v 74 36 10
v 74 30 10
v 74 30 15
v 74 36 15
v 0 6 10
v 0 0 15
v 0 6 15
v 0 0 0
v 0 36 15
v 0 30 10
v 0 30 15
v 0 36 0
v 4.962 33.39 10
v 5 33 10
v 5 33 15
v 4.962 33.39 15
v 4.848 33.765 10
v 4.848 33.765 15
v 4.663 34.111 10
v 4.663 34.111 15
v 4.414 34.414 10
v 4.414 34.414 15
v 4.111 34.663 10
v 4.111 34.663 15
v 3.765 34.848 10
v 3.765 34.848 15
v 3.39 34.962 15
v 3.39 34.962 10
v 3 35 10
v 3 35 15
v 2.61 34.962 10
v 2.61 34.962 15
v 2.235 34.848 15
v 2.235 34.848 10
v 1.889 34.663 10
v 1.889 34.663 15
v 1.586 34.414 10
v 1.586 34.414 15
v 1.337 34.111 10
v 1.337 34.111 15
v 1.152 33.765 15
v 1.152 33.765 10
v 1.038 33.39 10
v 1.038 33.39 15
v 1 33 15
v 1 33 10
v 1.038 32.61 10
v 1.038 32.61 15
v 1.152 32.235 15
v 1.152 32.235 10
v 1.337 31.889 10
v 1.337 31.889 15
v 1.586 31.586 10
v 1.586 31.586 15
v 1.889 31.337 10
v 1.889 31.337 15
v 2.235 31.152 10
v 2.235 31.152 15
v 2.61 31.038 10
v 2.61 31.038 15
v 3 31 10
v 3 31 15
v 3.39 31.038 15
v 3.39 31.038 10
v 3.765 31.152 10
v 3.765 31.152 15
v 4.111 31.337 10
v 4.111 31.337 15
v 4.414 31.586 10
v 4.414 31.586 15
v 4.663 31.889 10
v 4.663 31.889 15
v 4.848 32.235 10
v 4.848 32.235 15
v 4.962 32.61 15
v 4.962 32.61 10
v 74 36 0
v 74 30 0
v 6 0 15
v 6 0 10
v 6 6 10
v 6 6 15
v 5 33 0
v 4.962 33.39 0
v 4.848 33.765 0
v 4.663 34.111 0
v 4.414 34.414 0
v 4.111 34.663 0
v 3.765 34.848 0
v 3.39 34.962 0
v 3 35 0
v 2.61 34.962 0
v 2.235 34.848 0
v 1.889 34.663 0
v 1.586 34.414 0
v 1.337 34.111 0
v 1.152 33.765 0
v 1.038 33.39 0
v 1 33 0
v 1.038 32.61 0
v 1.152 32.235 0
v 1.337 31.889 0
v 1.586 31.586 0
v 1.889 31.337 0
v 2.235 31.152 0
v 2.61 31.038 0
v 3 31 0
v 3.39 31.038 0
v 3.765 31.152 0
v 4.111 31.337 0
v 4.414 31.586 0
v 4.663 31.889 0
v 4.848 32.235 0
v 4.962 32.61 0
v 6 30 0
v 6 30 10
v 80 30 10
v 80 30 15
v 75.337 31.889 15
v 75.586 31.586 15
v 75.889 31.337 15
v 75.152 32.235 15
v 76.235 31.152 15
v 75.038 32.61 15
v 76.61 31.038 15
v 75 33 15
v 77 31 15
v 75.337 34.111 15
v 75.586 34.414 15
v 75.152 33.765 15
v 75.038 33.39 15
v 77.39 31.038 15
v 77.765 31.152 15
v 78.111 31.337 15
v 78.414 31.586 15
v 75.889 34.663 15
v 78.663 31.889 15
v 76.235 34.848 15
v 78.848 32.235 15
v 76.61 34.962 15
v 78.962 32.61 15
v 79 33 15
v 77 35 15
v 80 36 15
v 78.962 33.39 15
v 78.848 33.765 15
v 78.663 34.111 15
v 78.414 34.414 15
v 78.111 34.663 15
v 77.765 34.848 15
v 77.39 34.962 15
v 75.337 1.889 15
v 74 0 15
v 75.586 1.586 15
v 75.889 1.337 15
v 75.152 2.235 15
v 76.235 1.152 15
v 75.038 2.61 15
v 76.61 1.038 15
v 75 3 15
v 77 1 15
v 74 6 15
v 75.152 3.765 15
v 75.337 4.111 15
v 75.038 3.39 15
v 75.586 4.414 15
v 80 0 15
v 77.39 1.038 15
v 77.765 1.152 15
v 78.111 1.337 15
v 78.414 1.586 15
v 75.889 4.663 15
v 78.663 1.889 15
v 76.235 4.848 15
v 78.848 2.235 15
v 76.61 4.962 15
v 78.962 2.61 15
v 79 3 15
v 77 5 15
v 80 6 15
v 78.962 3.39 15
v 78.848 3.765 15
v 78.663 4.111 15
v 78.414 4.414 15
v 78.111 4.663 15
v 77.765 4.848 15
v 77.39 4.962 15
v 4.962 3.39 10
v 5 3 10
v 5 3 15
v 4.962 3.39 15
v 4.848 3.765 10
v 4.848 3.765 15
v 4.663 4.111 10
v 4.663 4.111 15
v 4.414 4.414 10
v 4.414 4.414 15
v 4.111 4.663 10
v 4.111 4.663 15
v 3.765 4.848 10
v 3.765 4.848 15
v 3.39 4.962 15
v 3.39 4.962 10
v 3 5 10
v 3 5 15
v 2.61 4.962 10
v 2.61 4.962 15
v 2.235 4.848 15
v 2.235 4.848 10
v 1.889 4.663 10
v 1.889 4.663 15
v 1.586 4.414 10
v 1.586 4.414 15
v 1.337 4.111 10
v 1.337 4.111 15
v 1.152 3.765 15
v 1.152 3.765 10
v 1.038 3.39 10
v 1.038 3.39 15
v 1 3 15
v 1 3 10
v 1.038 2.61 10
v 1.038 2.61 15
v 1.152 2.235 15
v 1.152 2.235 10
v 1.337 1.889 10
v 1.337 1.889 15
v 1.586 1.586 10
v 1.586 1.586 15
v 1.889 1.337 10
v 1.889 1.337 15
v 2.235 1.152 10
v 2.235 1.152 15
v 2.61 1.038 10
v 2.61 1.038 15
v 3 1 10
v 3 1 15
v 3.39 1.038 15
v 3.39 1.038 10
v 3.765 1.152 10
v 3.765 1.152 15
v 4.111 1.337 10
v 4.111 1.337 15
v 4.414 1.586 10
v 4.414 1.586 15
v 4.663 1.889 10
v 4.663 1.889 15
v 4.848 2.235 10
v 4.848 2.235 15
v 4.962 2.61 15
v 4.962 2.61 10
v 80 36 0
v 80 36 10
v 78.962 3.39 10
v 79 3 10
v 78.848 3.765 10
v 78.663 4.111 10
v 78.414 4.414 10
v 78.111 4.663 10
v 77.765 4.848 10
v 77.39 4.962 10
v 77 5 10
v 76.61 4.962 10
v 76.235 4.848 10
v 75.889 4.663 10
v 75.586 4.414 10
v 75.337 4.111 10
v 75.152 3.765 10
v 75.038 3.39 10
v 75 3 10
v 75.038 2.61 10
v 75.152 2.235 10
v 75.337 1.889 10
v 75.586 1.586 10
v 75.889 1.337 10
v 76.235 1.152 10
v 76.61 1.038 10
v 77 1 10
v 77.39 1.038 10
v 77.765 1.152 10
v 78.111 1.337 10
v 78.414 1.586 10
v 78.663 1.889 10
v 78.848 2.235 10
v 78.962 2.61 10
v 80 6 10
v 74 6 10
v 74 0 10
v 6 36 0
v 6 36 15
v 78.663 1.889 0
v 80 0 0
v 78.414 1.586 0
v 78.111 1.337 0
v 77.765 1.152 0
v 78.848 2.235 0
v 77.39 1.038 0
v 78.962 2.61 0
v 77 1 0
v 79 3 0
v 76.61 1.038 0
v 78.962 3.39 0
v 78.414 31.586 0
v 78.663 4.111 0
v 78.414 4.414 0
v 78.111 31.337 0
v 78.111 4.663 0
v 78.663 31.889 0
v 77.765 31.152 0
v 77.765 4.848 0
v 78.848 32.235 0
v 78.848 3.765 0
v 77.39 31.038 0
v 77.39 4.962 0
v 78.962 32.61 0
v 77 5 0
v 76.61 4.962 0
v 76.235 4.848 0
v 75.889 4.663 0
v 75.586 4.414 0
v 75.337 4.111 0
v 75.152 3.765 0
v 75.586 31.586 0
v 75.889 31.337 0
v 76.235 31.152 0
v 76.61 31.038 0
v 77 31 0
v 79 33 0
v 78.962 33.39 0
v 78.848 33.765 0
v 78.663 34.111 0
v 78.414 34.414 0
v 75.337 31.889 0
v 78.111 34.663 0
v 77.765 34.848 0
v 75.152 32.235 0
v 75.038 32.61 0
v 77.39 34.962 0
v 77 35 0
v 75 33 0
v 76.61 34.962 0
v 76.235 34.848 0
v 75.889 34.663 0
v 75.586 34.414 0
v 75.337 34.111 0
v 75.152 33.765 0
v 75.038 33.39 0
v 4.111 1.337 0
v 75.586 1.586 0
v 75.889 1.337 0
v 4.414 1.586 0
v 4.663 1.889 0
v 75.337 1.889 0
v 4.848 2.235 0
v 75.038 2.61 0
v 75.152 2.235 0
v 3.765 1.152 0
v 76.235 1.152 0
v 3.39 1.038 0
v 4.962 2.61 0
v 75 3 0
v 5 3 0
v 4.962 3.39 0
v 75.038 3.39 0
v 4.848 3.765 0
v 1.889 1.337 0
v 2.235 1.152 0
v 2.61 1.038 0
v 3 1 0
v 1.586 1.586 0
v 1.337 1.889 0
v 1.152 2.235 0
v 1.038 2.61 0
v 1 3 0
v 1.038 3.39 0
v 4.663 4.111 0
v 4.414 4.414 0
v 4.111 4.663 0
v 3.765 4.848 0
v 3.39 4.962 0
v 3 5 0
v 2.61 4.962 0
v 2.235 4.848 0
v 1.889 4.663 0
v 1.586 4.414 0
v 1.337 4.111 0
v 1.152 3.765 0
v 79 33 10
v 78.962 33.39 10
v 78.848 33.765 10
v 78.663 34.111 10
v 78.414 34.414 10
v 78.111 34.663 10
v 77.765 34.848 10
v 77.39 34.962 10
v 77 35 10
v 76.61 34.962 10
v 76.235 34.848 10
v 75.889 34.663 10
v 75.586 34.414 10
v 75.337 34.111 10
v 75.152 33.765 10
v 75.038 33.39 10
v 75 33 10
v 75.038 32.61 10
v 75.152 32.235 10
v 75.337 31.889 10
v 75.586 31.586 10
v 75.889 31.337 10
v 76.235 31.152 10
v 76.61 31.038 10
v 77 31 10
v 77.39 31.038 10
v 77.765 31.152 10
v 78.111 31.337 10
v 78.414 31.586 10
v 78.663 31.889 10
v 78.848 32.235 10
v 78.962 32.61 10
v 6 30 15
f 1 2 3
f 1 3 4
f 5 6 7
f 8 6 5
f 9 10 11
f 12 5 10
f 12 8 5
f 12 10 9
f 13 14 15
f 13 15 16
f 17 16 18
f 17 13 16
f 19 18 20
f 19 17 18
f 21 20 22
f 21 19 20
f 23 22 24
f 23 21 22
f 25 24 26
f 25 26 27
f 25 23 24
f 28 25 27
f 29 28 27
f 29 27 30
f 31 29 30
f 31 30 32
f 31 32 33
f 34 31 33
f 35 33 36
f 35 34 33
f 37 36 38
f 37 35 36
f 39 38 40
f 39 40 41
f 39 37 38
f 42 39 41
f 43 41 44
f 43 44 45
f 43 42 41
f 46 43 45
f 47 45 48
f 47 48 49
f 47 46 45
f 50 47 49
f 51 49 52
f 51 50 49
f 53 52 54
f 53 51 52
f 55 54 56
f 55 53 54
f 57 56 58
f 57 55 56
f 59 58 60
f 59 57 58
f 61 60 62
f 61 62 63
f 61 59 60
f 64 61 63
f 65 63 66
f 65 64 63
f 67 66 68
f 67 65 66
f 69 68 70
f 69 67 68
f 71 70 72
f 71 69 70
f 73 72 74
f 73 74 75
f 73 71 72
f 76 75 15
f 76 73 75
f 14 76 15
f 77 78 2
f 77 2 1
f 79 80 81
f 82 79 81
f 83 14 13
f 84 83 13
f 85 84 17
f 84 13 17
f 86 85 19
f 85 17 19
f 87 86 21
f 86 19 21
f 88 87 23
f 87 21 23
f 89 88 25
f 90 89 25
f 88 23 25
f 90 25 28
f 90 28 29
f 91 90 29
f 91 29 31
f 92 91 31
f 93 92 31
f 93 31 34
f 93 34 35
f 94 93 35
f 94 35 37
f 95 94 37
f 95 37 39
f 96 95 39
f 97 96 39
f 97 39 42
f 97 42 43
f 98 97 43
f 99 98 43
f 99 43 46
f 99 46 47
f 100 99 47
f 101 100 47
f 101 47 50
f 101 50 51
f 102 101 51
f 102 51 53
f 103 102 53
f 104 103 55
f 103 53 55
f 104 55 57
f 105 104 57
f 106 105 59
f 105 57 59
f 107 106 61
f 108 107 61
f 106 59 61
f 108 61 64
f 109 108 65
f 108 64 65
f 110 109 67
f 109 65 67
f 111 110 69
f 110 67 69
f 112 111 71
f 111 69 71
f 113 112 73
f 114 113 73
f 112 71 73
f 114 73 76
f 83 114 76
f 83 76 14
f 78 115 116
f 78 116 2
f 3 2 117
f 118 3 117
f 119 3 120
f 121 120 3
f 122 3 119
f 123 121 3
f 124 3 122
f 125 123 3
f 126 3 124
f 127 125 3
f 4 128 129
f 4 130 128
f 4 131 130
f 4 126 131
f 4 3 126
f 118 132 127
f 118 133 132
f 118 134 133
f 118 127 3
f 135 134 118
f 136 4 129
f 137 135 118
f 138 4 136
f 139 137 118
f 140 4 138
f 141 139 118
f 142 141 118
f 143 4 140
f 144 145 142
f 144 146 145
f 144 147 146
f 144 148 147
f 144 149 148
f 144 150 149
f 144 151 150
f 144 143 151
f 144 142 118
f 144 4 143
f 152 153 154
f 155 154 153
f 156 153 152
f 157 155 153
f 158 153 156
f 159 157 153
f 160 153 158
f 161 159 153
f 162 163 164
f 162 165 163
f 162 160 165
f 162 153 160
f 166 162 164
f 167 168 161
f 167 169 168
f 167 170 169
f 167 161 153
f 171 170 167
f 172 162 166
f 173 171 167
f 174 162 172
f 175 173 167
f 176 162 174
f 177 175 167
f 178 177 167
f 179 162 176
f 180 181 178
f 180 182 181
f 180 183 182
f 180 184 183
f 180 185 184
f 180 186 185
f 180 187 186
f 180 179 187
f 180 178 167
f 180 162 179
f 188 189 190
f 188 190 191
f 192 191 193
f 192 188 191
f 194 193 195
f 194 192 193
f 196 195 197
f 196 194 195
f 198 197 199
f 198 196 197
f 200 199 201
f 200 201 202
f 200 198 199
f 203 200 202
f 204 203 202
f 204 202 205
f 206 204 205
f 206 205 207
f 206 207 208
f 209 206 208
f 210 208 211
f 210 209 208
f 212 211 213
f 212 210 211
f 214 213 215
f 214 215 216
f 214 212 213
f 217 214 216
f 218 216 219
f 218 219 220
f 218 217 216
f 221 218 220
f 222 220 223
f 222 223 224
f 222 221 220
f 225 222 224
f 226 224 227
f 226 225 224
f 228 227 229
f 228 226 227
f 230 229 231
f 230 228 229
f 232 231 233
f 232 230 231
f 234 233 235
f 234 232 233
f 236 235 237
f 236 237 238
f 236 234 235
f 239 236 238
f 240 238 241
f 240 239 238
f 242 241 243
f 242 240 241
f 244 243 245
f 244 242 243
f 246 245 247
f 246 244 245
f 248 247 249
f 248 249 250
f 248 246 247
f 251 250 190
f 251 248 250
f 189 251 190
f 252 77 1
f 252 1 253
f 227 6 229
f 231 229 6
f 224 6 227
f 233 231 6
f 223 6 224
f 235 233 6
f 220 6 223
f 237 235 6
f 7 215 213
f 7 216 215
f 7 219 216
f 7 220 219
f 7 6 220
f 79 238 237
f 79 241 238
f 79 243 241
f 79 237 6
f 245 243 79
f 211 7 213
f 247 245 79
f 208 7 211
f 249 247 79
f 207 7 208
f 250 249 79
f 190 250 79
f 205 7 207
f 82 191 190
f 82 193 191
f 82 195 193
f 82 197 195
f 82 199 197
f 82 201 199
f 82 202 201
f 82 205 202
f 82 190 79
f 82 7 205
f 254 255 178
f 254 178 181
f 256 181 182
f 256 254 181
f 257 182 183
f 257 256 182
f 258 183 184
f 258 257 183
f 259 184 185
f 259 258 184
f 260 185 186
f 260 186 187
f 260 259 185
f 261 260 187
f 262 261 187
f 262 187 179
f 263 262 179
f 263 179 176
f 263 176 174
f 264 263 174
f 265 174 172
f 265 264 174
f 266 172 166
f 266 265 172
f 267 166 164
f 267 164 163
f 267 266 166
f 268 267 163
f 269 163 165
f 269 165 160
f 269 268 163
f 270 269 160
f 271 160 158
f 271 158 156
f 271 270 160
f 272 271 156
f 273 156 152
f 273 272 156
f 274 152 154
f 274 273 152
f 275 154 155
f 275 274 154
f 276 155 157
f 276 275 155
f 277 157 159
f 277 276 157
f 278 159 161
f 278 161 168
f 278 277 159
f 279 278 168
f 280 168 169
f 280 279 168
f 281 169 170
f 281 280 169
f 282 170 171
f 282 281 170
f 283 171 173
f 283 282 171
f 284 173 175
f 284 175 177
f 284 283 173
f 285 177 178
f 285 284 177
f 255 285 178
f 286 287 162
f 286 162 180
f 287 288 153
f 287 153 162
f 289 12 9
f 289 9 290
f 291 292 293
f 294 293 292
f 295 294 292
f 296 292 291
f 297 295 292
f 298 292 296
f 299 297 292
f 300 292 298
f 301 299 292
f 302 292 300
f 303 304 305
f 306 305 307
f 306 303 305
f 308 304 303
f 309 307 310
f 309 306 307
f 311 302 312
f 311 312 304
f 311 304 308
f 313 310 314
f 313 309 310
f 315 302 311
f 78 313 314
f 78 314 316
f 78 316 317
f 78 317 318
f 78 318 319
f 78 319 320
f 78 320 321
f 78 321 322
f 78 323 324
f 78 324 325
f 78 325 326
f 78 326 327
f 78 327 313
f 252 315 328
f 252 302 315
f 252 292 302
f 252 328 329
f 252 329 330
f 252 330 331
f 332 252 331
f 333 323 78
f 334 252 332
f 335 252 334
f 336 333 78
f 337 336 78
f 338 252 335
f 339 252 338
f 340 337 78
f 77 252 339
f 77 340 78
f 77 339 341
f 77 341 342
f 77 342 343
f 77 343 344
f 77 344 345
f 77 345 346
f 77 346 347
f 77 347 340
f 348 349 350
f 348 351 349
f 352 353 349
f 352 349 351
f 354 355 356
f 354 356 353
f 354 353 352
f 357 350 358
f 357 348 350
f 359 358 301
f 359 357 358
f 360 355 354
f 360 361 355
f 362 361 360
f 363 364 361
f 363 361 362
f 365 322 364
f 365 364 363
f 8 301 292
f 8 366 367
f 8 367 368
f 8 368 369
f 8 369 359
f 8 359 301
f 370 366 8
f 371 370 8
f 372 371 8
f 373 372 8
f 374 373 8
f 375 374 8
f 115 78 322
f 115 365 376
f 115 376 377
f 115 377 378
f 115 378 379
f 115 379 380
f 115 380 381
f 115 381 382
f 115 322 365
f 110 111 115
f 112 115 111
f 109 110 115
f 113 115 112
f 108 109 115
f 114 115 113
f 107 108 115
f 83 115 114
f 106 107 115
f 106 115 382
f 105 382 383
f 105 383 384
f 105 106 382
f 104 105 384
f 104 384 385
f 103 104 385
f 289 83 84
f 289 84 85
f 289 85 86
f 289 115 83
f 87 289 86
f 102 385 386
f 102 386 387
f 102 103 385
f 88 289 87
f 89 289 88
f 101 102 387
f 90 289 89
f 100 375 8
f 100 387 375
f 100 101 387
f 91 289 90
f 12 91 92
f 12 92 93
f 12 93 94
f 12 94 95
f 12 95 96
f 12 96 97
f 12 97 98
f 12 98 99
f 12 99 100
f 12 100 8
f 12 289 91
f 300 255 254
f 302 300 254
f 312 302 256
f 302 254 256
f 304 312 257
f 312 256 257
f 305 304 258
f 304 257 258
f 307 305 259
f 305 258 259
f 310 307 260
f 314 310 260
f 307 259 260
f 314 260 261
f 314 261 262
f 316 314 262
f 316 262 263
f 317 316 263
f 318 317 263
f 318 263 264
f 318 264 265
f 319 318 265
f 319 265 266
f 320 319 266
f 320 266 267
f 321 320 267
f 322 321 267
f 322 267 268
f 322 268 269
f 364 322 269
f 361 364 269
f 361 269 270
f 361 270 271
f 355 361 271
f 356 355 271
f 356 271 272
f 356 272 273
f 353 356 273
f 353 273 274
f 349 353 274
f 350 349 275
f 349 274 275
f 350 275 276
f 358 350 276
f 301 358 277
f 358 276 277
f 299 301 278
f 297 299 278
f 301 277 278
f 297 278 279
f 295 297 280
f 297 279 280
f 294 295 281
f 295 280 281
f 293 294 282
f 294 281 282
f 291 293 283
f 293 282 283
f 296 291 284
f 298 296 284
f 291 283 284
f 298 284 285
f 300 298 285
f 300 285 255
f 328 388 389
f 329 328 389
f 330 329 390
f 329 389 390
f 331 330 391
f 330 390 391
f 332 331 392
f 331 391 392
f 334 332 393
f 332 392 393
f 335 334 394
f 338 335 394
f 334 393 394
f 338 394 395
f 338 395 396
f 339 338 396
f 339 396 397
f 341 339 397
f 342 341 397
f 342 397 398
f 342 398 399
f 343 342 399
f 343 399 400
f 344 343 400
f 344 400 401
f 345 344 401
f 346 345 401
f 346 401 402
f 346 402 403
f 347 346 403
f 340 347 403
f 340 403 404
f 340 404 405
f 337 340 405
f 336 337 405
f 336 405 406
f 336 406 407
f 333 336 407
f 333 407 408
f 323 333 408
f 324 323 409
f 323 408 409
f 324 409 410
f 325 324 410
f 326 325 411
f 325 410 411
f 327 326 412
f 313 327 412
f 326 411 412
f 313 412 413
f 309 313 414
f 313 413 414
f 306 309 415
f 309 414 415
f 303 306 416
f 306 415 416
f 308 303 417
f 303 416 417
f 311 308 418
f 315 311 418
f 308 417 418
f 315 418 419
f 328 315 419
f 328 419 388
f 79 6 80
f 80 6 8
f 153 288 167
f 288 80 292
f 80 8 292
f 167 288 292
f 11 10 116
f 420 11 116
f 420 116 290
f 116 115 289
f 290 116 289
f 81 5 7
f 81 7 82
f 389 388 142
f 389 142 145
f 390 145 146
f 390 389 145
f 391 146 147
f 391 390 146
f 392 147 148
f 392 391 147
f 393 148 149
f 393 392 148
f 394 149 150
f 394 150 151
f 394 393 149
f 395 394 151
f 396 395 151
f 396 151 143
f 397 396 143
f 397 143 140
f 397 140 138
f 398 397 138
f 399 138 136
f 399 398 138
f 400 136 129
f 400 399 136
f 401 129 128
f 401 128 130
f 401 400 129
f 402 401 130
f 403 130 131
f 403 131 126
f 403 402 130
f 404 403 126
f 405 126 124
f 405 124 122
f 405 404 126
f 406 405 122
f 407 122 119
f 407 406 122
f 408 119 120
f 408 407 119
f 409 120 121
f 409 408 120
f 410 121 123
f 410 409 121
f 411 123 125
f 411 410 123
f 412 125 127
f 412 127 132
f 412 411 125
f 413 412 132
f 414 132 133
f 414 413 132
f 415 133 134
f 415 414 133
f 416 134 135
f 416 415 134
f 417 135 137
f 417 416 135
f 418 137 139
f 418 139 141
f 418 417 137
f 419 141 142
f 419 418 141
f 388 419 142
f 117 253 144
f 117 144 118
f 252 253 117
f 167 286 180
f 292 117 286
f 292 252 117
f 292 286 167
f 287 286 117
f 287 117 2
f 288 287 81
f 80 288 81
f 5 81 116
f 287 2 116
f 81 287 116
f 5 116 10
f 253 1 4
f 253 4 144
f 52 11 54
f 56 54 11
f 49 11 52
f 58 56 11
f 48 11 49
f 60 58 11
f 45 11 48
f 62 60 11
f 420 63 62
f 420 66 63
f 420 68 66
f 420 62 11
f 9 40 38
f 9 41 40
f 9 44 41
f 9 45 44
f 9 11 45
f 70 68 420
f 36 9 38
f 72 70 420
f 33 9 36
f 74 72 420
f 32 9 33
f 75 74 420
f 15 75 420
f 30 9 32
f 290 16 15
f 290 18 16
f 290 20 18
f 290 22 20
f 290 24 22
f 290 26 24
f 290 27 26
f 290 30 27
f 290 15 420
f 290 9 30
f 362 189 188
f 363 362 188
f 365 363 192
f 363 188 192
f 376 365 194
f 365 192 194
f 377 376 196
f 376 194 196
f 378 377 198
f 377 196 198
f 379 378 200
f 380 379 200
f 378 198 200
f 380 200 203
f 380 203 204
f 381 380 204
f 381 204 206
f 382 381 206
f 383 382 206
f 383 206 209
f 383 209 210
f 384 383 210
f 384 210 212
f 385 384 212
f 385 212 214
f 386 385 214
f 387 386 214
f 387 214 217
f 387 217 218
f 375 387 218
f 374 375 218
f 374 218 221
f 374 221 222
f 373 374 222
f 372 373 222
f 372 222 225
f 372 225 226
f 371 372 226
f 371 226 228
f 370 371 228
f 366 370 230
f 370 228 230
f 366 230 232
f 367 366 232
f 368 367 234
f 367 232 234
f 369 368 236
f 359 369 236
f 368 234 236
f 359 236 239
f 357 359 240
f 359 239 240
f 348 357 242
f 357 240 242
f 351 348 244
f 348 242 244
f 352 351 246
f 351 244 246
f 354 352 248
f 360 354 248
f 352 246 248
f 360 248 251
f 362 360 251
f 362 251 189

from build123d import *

# Parameters (mm, degrees)
BOSS_EXTRUDE1_DEPTH  = 10
SKETCH2_W            = 6
SKETCH2_H            = 6
SKETCH2_R            = 2
BOSS_EXTRUDE2_DEPTH  = 5
SKETCH2_2_R          = 2
CUT_EXTRUDE1_DEPTH   = 11
LPATTERN2_COUNT      = 2
LPATTERN2_PITCH      = 74
LPATTERN2_COUNT_DIR2 = 2
LPATTERN2_PITCH_DIR2 = 30


with BuildPart() as part:
    # Sketch1 → Boss-Extrude1 (new body)
    with BuildSketch(Plane.XY):
        Polygon((0, 36), (6, 36), (6, 30), (74, 30), (74, 36), (80, 36), (80, 0), (0, 0), align=None)
    extrude(amount=BOSS_EXTRUDE1_DEPTH)

    # Sketch2 → Boss-Extrude2 (add)
    with BuildSketch(Plane.XY.offset(10)):
        with Locations((3, 33)):
            Rectangle(SKETCH2_W, SKETCH2_H)
        with Locations((3, 33)):
            Circle(SKETCH2_R, mode=Mode.SUBTRACT)
    boss_extrude2 = extrude(amount=BOSS_EXTRUDE2_DEPTH)

    # Sketch2<2> → Cut-Extrude1 (cut, through all)
    with BuildSketch(Plane.XY.offset(10)):
        with Locations((3, 33)):
            Circle(SKETCH2_2_R)
    cut_extrude1 = extrude(amount=-CUT_EXTRUDE1_DEPTH, mode=Mode.SUBTRACT)

    # LPattern2: Boss-Extrude2, Cut-Extrude1 2 × 2
    with Locations(*[(i * LPATTERN2_PITCH, -j * LPATTERN2_PITCH_DIR2, 0) for i in range(LPATTERN2_COUNT) for j in range(LPATTERN2_COUNT_DIR2) if (i, j) != (0, 0)]):
        add(boss_extrude2)
        add(cut_extrude1, mode=Mode.SUBTRACT)


solid = part.part
